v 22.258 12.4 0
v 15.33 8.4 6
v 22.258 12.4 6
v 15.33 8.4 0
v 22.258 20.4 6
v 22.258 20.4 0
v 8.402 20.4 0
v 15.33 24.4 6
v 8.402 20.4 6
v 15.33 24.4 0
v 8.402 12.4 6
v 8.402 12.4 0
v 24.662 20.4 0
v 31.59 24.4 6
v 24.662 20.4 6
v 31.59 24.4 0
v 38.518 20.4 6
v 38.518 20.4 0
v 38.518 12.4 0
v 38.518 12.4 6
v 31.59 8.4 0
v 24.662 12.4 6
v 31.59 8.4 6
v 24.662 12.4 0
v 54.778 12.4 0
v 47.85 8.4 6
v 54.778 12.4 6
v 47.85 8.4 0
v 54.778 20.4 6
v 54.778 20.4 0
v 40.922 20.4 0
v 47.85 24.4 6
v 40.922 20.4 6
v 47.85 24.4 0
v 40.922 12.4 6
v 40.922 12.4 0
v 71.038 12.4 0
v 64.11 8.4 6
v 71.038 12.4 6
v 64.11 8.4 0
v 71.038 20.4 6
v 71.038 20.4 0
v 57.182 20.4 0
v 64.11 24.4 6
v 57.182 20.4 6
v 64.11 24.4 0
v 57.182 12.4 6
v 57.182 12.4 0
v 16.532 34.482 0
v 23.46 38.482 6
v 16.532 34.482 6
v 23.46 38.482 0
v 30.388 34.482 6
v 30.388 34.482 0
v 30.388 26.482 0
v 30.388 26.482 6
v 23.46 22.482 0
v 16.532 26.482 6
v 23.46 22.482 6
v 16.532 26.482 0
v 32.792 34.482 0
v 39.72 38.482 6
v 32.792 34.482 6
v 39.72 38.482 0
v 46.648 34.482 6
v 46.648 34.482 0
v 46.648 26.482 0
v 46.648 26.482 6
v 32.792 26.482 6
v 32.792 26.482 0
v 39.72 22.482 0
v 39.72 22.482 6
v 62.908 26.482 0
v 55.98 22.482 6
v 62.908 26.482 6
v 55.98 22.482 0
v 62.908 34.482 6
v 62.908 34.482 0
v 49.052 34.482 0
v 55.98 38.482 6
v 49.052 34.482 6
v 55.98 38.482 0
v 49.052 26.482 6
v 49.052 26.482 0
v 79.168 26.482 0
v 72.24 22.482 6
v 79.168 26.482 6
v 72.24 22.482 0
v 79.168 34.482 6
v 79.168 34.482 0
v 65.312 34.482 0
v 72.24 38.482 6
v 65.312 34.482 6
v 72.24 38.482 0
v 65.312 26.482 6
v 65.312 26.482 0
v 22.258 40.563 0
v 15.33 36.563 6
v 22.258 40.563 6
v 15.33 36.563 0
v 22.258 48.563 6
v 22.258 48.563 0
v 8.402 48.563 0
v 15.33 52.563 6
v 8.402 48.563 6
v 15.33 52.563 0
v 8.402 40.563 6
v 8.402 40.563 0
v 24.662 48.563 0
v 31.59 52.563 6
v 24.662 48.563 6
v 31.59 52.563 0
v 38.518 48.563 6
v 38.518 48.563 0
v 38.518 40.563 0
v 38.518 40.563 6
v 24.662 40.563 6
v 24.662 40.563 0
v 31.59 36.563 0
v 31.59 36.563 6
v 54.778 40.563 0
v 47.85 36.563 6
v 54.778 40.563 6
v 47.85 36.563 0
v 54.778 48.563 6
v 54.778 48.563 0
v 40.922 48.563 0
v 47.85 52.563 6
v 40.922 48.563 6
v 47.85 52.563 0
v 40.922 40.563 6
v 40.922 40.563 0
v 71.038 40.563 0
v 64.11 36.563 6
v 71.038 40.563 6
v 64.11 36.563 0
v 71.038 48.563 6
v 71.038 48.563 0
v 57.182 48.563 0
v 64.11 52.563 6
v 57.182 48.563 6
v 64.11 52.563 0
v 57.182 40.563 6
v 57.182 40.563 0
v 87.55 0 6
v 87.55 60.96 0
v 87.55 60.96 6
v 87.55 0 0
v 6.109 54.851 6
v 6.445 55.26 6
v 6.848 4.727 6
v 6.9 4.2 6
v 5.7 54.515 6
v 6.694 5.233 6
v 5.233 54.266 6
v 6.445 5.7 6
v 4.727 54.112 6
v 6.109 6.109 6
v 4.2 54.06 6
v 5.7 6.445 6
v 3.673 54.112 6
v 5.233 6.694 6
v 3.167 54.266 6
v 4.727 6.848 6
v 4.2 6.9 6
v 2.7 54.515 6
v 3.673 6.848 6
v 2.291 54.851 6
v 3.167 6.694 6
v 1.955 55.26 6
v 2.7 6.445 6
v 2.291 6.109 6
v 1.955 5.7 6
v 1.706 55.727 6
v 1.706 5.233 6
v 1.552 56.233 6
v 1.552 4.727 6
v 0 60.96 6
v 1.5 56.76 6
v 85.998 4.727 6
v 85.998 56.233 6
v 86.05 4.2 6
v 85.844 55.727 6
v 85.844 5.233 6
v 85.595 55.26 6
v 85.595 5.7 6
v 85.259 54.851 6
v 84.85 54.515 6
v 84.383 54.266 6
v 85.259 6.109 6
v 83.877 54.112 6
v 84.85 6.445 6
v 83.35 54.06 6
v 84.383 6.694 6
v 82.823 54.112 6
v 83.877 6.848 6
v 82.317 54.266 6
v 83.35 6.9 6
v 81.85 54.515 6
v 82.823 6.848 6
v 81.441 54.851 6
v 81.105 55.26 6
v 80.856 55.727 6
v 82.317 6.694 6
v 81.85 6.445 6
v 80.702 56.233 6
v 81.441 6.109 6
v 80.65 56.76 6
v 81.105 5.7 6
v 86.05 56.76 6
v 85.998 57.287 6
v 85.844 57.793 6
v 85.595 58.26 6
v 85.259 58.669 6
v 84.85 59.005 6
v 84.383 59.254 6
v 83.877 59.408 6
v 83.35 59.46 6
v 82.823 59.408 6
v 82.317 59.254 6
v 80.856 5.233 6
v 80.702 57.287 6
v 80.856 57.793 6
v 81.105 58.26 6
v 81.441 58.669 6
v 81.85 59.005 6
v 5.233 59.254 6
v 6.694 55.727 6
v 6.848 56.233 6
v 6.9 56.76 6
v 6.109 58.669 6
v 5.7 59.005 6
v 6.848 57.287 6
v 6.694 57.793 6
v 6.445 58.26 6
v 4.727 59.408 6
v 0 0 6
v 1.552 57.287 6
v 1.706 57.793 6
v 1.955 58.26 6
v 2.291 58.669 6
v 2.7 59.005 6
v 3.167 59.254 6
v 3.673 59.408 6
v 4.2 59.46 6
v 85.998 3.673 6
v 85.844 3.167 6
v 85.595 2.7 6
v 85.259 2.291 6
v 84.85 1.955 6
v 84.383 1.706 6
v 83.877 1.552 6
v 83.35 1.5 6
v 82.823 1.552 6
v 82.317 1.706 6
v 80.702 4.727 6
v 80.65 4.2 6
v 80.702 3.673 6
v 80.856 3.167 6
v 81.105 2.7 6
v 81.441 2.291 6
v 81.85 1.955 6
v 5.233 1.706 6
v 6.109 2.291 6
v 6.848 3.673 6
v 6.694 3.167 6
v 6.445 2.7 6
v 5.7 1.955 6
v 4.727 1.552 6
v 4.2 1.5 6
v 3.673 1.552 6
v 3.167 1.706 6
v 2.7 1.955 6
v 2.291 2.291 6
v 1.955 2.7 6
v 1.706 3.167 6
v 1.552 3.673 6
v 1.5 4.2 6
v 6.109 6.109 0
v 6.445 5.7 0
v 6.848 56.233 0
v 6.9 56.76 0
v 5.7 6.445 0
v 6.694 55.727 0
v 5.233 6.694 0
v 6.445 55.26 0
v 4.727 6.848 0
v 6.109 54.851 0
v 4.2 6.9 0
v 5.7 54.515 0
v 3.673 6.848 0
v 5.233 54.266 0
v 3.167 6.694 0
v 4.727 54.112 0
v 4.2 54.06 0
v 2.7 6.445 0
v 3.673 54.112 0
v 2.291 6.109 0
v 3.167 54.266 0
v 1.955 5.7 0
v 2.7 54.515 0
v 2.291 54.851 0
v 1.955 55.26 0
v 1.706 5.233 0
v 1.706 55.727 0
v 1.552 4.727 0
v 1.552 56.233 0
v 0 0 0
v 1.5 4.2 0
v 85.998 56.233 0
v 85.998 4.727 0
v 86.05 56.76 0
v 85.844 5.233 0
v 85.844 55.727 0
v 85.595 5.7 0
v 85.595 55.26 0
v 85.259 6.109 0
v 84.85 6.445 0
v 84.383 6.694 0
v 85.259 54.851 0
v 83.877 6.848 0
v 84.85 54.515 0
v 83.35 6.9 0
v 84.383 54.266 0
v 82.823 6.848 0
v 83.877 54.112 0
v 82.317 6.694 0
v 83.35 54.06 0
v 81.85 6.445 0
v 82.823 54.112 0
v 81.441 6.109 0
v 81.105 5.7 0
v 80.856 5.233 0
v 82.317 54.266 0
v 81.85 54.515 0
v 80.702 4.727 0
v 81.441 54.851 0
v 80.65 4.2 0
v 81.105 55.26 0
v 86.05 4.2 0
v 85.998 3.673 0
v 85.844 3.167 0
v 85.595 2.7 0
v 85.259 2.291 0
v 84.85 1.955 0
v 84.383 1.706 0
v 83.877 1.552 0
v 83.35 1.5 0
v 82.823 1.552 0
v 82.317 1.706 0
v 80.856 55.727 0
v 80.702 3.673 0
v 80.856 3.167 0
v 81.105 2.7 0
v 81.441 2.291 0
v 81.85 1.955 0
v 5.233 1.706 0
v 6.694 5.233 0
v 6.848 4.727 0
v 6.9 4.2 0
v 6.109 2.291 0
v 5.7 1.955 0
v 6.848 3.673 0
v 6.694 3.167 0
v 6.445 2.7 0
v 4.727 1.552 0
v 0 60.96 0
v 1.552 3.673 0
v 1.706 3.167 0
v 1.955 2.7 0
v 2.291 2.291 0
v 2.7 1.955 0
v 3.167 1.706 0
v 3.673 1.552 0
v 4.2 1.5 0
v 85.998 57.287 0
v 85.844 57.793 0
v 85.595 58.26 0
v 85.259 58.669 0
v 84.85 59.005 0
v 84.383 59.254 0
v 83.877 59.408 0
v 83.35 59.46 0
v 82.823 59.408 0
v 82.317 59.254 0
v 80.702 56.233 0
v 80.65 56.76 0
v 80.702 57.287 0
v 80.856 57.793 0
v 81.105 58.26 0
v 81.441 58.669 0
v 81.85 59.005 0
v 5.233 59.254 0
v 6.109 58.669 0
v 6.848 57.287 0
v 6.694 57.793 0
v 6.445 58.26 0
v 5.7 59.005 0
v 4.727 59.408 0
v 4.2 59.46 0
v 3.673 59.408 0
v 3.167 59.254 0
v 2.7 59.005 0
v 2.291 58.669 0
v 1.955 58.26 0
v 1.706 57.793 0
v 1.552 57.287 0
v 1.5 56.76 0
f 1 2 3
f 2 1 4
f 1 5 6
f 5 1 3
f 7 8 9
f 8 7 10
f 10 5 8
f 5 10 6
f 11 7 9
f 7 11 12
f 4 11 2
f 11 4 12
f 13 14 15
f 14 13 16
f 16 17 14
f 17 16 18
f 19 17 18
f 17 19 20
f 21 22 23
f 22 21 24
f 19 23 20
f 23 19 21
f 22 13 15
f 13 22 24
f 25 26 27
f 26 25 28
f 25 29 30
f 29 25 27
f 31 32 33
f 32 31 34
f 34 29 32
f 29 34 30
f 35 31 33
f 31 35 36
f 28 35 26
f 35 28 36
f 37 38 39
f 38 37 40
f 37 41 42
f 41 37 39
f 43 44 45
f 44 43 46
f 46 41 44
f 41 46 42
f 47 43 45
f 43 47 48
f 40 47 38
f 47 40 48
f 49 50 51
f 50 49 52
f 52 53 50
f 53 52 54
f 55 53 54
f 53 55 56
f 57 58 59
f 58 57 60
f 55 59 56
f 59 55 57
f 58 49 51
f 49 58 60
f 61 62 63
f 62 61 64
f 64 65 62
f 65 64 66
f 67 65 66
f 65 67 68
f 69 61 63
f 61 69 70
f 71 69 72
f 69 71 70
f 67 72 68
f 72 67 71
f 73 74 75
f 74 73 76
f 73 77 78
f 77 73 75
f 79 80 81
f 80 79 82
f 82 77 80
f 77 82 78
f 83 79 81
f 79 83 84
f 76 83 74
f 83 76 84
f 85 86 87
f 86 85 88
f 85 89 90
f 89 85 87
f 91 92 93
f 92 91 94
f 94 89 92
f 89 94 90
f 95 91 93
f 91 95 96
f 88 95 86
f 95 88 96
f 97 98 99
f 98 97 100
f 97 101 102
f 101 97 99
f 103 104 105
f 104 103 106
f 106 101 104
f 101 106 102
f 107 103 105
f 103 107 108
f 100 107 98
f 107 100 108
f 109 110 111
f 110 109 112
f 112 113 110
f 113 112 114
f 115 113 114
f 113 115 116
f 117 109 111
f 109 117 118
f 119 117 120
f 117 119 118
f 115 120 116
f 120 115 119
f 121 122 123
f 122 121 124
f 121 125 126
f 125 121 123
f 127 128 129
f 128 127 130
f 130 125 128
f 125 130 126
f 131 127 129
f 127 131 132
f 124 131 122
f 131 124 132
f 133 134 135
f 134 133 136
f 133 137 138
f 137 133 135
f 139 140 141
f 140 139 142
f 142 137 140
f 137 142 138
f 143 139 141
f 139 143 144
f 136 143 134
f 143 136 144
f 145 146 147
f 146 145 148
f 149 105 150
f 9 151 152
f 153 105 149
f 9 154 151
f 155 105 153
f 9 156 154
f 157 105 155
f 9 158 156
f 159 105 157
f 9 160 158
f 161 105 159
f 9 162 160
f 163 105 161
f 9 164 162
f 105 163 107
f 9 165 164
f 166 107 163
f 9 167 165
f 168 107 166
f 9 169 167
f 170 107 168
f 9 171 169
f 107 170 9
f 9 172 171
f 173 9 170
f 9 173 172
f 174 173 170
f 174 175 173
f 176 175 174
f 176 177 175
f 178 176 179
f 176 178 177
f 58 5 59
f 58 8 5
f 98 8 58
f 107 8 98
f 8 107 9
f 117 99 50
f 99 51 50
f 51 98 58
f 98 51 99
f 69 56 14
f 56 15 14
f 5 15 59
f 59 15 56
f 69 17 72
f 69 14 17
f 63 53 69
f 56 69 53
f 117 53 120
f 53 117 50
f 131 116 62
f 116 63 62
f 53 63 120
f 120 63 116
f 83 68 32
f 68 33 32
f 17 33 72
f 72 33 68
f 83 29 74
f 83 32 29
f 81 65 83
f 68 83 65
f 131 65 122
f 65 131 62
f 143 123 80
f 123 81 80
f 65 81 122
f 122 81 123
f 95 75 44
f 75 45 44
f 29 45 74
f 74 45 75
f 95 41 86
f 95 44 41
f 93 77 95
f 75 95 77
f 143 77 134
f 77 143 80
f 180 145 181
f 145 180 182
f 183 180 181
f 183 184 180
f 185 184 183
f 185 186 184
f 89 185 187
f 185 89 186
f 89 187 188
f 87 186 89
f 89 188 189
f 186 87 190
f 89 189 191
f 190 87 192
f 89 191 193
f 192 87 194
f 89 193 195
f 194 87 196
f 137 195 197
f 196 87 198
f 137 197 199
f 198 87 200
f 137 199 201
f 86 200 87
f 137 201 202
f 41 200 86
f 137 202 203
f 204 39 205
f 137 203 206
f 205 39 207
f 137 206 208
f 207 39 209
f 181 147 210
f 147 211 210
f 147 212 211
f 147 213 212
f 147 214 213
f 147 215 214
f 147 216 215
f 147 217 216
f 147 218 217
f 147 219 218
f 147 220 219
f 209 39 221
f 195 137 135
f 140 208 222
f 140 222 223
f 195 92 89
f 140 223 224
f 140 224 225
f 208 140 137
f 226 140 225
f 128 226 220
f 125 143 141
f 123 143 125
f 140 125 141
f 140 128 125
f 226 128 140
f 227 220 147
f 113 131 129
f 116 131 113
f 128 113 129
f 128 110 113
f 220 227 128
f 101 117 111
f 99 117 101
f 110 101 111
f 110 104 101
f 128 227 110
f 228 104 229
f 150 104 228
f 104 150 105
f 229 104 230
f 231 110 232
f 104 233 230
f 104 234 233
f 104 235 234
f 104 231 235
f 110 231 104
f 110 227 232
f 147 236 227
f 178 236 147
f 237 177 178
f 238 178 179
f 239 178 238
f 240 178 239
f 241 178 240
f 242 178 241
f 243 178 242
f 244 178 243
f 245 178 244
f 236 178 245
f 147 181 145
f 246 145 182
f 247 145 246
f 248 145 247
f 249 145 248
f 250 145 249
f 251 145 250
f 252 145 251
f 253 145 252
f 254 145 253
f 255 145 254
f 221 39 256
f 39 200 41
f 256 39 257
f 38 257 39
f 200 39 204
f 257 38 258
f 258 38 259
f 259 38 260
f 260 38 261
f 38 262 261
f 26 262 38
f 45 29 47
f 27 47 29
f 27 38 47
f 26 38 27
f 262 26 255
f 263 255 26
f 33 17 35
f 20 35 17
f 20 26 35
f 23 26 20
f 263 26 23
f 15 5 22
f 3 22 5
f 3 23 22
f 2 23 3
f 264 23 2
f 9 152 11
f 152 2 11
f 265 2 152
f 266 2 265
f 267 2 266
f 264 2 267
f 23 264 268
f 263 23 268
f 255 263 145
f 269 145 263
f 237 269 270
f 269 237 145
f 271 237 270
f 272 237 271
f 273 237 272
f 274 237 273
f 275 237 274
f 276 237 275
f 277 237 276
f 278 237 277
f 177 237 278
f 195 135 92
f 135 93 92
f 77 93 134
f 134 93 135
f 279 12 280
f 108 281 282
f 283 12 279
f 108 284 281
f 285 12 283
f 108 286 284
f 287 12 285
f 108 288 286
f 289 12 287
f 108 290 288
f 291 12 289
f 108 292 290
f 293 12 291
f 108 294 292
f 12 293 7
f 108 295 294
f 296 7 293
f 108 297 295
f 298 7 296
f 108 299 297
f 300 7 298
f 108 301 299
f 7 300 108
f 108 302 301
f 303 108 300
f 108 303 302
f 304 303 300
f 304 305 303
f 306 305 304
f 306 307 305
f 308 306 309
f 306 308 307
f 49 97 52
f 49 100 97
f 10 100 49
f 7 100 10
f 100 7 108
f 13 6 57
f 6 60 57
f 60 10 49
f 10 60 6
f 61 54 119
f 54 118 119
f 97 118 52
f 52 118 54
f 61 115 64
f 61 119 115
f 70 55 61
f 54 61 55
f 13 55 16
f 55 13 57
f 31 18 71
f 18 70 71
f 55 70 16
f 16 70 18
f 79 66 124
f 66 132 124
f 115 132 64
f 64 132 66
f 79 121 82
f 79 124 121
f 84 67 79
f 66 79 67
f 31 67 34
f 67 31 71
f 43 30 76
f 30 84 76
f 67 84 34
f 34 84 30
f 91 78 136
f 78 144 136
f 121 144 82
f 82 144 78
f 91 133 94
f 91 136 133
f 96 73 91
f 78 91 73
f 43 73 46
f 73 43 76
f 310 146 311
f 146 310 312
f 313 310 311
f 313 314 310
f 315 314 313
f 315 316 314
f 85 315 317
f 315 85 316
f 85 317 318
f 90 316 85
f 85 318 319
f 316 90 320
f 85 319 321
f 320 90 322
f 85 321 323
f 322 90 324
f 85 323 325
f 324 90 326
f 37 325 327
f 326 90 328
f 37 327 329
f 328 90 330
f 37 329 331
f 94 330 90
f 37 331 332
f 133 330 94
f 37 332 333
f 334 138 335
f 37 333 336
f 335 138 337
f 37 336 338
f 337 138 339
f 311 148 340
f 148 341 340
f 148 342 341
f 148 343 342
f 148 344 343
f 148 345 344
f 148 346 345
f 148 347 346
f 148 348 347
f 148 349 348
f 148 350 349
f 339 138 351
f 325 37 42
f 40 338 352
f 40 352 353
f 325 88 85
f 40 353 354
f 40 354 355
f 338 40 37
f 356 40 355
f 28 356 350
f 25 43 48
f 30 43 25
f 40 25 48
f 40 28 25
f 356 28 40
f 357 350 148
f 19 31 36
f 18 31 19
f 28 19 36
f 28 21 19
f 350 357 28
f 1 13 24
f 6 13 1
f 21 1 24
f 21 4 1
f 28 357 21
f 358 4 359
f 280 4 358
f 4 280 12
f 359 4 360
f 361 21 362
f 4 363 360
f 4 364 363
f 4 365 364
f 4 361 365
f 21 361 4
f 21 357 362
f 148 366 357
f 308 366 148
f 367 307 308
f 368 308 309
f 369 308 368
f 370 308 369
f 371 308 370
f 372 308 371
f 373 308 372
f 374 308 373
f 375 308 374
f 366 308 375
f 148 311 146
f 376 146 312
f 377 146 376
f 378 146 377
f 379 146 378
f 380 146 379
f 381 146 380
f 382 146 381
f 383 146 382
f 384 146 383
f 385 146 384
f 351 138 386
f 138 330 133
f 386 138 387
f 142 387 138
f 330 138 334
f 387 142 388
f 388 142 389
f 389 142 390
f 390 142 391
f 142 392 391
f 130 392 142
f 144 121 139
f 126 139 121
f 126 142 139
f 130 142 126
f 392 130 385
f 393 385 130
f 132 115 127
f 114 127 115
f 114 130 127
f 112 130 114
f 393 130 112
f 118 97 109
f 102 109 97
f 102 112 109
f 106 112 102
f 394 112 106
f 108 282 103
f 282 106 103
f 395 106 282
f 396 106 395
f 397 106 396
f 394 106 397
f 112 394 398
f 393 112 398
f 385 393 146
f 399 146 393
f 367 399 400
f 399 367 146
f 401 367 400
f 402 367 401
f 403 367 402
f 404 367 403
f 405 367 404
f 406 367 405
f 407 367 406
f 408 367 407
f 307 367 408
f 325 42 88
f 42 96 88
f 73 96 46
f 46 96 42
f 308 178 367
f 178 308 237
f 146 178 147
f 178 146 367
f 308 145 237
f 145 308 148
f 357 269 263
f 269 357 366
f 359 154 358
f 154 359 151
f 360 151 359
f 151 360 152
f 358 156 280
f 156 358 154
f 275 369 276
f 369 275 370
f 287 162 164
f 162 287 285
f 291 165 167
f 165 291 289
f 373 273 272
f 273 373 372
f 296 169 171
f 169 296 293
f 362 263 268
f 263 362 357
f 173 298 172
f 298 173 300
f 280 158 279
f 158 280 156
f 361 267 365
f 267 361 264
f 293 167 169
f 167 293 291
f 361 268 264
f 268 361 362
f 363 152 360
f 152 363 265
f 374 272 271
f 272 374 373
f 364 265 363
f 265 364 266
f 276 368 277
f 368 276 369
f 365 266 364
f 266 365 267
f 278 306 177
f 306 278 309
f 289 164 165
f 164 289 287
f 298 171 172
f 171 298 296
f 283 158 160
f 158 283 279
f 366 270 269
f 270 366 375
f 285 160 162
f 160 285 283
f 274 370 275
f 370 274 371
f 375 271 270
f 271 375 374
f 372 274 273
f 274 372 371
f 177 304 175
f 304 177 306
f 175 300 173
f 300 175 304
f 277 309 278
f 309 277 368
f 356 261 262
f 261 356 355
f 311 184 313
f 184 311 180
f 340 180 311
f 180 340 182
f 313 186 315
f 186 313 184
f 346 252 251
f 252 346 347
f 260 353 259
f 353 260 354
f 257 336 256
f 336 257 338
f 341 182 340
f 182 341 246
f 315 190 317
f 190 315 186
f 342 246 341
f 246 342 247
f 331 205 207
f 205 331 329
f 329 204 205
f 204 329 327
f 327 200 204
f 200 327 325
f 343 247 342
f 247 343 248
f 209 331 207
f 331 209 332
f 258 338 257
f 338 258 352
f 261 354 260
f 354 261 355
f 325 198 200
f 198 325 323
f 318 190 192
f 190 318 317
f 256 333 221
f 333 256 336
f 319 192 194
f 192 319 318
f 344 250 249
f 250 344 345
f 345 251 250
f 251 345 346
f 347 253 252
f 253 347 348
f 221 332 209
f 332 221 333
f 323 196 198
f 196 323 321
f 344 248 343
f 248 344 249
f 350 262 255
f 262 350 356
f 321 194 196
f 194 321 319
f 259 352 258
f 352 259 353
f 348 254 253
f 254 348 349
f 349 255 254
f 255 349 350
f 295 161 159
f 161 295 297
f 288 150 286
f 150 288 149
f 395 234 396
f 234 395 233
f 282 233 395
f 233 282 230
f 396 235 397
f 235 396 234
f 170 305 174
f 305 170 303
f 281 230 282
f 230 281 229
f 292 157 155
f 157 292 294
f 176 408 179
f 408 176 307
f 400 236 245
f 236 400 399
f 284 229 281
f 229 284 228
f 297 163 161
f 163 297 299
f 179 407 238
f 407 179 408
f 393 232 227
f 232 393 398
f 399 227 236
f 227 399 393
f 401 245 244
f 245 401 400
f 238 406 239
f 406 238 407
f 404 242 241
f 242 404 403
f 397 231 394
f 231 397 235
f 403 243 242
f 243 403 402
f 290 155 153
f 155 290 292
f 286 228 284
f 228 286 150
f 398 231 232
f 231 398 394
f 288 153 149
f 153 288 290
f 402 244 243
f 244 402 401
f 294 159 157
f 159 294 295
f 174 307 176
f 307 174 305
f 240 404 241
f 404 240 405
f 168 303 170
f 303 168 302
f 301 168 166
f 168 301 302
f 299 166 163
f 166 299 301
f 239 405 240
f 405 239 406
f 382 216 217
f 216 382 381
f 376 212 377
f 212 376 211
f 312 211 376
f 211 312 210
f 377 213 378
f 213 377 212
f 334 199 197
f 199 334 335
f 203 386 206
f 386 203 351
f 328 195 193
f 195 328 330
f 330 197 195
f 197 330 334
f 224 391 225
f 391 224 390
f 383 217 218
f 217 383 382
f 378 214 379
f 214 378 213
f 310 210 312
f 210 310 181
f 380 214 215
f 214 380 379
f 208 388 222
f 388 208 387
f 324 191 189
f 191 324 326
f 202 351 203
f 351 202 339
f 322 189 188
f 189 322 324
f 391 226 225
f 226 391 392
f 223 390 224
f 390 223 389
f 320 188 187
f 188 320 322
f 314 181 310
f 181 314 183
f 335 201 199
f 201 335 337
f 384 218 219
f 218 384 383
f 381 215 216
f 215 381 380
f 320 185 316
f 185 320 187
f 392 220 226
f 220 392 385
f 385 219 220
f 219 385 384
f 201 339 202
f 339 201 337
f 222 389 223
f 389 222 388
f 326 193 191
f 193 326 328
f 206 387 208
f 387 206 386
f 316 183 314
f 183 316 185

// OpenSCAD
$fn = 32;

// ----------------------------------------------------------------------
// Honeycomb panel: 87.55 x 60.96 mm, 12 cells of 16 mm
// ----------------------------------------------------------------------

// --- parameters (mm) ---
panel_w = 87.55;          // panel width
panel_d = 60.96;          // panel depth
thick = 6;                // panel thickness
cell_r = 8;               // hex cell circumradius
pitch = 16.26;            // hex cell pitch (centre to centre)
web = 2.4;                // web between the cells
columns = 4;              // columns of cells
rows = 3;                 // rows of cells
cell_count = 12;          // total cells
shift_x = 15.33;          // first cell offset in x
shift_y = 16.4;           // first cell offset in y
mount_d = 5.4;            // corner mounting holes
hole_off = 4.2;           // mounting hole offset from the corners

difference() {
  union() {
    cube([panel_w, panel_d, thick]);
  }
  /* hexagonal cells, point-up, cut right through the plate */
  for (row = [0 : rows - 1]) {
    for (col = [0 : columns - 1]) {
      translate([shift_x + col * pitch + (row % 2) * pitch / 2, shift_y + row * pitch * 0.866025, -2.5]) rotate([0, 0, 30]) cylinder(h = thick + 5, d = 2 * cell_r, $fn = 6);
    }
  }
  /* corner mounting holes, clear of the outer cell web */
  translate([4.2, 4.2, -2.5]) cylinder(h = thick + 5, d = mount_d);
  translate([83.35, 4.2, -2.5]) cylinder(h = thick + 5, d = mount_d);
  translate([4.2, 56.76, -2.5]) cylinder(h = thick + 5, d = mount_d);
  translate([83.35, 56.76, -2.5]) cylinder(h = thick + 5, d = mount_d);
}
